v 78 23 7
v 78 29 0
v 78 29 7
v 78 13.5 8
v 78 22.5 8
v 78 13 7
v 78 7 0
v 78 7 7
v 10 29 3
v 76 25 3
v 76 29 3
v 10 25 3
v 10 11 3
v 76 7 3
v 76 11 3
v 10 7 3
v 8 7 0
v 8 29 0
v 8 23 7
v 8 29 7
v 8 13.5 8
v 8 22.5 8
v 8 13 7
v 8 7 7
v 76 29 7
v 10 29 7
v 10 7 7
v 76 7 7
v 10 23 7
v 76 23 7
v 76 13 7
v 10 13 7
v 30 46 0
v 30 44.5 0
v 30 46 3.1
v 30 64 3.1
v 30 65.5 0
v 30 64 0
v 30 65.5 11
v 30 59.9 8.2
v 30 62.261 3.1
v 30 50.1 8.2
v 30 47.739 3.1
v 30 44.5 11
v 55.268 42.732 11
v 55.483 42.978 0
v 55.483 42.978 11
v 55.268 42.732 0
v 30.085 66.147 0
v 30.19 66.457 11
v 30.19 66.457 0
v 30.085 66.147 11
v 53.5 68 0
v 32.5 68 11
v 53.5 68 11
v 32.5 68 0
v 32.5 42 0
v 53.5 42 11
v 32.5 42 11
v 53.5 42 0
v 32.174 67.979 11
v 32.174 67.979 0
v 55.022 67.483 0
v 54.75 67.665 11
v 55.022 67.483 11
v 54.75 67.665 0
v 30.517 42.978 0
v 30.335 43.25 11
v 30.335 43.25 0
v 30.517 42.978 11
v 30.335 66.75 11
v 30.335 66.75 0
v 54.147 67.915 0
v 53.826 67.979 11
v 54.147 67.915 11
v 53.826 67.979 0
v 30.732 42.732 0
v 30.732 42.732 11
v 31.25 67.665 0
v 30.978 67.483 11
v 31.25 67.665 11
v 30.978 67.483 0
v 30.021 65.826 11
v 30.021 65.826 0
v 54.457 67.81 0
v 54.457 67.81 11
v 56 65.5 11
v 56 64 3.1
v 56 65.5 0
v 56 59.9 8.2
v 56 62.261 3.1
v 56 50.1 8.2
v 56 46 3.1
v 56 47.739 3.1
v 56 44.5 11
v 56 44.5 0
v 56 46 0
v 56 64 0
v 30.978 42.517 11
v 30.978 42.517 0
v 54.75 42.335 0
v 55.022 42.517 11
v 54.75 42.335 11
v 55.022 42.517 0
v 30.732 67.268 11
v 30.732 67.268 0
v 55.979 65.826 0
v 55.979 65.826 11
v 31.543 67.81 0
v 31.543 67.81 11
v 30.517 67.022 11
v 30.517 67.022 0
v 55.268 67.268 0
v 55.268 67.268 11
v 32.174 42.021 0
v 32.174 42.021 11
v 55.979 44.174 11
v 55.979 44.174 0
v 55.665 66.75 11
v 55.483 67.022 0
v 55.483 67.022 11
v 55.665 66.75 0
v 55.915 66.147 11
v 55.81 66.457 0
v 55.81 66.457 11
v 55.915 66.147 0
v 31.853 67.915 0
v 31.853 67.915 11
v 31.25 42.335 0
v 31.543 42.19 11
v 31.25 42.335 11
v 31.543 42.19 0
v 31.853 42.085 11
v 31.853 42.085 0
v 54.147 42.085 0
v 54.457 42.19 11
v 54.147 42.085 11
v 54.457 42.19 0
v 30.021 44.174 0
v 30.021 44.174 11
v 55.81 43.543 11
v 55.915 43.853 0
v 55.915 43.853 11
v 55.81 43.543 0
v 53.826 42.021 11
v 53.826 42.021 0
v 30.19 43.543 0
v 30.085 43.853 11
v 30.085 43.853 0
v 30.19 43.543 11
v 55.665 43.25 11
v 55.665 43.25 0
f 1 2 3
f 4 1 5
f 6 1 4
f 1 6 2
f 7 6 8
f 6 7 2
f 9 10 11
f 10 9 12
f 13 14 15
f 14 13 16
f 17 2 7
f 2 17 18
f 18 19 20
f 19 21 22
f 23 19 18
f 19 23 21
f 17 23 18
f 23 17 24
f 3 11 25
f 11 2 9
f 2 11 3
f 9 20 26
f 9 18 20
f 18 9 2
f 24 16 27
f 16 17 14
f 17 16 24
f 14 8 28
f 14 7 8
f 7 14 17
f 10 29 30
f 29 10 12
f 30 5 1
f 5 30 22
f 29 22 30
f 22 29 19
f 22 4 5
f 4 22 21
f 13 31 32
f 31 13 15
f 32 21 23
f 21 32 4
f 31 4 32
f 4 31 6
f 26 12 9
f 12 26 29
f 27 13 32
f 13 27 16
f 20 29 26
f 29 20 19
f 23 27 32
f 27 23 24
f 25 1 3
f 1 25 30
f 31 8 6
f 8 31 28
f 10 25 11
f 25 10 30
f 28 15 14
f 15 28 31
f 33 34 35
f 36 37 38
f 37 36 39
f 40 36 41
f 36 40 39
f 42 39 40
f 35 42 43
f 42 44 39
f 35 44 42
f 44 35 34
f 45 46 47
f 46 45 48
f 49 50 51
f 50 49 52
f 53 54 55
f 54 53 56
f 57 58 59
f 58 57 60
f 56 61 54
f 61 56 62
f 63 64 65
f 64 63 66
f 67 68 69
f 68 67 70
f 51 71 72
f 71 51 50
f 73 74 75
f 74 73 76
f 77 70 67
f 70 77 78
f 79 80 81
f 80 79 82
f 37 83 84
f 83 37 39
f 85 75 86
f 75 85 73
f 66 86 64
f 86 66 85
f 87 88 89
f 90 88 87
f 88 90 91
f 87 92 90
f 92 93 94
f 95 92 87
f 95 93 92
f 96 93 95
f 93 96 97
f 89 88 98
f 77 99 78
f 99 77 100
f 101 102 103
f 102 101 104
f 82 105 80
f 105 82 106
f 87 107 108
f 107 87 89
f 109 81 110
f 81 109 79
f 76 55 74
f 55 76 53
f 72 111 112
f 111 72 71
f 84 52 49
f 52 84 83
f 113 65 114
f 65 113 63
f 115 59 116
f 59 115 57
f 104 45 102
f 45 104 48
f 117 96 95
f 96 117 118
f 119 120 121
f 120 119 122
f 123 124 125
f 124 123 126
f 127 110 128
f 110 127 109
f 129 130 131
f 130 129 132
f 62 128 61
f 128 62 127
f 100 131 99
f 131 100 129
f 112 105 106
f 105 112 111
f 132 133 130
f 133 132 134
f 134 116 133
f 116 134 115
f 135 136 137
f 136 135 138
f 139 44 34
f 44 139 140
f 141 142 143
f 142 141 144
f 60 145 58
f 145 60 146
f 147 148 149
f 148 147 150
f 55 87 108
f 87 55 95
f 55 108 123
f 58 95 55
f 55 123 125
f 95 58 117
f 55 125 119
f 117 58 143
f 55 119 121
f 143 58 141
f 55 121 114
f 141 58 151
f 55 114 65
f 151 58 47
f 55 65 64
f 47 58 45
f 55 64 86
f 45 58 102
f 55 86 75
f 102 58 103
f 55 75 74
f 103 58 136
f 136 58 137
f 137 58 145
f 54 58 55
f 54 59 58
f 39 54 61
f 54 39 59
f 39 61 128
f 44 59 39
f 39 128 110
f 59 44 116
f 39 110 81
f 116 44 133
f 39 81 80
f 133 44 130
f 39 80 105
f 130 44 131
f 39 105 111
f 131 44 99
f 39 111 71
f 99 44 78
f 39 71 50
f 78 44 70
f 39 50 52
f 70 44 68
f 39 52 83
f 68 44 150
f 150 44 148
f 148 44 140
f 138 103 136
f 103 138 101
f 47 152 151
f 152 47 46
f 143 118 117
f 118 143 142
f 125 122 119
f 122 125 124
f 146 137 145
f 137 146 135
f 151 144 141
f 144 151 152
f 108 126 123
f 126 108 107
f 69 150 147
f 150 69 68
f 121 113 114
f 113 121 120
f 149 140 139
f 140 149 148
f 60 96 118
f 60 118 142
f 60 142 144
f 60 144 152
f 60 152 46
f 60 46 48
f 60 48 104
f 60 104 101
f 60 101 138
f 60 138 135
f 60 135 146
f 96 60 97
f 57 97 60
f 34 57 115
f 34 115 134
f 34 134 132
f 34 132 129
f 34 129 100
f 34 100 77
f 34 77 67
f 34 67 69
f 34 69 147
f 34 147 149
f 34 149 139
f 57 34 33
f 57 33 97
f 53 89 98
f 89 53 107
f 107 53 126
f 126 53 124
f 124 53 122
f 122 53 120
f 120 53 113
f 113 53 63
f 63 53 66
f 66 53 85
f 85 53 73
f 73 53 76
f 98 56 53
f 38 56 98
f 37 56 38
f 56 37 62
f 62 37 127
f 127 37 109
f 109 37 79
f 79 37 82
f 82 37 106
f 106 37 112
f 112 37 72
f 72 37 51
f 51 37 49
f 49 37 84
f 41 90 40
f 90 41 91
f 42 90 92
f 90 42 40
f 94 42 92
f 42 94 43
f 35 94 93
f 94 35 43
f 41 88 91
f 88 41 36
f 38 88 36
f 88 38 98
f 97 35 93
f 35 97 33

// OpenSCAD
/*
Sample 087: Schwalbenschwanz-Linearführung — 0,40 mm
Generated from the FDM Mechanical Sample Library.
Units: millimetres.

Override examples:
  openscad -o custom.stl -D 'view="plate"' -D 'render_fn=64' model.scad
  openscad -o preview.png -D 'view="assembly"' model.scad
*/
use <../../../library/fdm_mechanisms.scad>

render_fn = is_undef(render_fn) ? 48 : render_fn;
view = is_undef(view) ? "plate" : view;
$fn = render_fn;

sample_dovetail_rail(
    view=view,
    clearance=0.4,
    length=70,
    carriage_l=26
);
